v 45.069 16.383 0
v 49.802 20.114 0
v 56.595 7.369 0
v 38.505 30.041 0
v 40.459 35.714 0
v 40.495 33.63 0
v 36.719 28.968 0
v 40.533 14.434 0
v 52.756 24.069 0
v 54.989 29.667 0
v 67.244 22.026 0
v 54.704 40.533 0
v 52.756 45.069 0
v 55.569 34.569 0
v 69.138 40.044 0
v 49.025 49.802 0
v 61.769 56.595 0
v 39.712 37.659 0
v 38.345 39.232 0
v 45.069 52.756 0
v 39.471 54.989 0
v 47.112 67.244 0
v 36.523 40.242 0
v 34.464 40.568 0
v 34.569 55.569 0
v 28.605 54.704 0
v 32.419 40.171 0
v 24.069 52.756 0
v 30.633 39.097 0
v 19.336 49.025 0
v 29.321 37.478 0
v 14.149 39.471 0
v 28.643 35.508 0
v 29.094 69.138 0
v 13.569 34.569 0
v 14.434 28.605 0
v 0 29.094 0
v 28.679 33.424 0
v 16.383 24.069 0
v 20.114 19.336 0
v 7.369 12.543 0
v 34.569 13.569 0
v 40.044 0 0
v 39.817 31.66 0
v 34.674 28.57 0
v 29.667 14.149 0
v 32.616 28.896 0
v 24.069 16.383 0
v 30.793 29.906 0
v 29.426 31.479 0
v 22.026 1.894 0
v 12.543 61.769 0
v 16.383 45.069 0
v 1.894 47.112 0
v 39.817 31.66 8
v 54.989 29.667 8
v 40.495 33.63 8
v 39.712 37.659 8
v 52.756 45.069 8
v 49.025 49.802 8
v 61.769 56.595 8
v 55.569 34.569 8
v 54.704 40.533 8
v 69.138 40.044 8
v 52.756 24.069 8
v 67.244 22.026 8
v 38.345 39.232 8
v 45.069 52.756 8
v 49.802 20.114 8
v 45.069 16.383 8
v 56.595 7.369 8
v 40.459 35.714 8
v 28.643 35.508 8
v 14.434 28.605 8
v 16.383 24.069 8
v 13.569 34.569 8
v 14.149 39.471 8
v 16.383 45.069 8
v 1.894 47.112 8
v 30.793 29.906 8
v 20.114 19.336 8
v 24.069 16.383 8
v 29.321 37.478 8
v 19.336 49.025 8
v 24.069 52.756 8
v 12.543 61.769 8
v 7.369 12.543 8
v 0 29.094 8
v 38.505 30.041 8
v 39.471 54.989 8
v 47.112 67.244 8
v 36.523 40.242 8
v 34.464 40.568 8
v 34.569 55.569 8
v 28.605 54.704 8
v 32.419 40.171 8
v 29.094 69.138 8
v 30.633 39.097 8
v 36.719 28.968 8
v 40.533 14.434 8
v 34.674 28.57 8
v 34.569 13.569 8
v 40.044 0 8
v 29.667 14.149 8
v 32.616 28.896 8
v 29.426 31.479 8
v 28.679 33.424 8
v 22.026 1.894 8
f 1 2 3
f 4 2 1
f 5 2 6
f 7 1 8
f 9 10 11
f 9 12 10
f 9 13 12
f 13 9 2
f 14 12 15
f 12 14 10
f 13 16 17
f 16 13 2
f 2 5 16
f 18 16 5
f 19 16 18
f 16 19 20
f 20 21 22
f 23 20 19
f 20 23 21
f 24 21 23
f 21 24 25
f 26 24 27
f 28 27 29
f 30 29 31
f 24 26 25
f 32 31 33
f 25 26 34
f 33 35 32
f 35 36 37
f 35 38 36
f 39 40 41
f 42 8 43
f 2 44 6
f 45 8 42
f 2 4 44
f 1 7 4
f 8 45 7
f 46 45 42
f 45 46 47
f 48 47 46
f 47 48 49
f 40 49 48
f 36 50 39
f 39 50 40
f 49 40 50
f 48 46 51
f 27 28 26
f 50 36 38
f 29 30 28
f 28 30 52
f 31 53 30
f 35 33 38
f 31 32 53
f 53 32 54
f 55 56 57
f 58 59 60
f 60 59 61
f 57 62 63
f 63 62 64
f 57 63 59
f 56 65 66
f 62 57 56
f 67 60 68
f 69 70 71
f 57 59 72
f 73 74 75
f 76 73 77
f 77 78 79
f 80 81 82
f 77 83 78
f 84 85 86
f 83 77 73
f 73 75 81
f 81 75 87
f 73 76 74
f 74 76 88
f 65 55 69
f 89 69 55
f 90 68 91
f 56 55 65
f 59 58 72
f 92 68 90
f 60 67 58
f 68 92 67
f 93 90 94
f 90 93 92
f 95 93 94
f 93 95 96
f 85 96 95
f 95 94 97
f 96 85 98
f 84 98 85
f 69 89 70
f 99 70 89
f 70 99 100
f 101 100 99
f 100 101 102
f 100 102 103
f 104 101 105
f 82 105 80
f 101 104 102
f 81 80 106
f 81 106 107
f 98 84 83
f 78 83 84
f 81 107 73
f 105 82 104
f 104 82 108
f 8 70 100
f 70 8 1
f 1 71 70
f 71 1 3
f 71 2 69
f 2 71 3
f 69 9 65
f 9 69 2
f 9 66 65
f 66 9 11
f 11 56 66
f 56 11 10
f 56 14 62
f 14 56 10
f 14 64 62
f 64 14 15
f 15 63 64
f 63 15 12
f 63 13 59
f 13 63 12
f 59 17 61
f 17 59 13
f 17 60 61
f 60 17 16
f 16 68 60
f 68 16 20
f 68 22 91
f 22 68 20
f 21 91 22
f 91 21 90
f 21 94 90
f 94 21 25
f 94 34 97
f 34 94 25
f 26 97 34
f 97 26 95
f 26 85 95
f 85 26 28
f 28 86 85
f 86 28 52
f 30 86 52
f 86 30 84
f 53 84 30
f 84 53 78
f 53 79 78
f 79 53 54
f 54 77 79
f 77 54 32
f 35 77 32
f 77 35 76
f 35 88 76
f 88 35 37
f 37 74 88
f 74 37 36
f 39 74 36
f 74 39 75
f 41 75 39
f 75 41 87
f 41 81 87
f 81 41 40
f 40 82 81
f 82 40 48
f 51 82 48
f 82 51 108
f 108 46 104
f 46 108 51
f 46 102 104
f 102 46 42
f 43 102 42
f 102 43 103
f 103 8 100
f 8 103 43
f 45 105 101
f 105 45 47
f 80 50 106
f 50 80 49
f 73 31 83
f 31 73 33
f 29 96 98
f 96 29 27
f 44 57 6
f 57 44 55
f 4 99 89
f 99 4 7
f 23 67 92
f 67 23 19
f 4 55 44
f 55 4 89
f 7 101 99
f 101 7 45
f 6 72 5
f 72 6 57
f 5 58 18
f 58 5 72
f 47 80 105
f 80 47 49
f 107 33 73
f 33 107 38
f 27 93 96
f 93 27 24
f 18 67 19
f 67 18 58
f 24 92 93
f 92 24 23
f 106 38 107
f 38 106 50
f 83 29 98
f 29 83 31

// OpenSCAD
$fn = 32;

// ----------------------------------------------------------------------
// Star wheel: 12-point ratchet, R35
// ----------------------------------------------------------------------

// --- parameters (mm) ---
n_points = 12;            // number of points / teeth
r_out = 35;               // tip radius
r_in = 21;                // root radius
bore_r = 6;               // centre bore radius
plate_t = 8;              // plate thickness, Z (extrusion height)
bore_d = 12;              // centre bore diameter
fit_tol = 0.1;            // declared fit tolerance (prompt contract)
free_tol = 0.3;           // declared free tolerance (prompt contract)

profile = [[55.569, 34.569], [69.138, 40.044], [54.704, 40.533], [52.756, 45.069], [61.769, 56.595], [49.025, 49.802], [45.069, 52.756], [47.112, 67.244], [39.471, 54.989], [34.569, 55.569], [29.094, 69.138], [28.605, 54.704], [24.069, 52.756], [12.543, 61.769], [19.336, 49.025], [16.383, 45.069], [1.894, 47.112], [14.149, 39.471], [13.569, 34.569], [0, 29.094], [14.434, 28.605], [16.383, 24.069], [7.369, 12.543], [20.114, 19.336], [24.069, 16.383], [22.026, 1.894], [29.667, 14.149], [34.569, 13.569], [40.044, 0], [40.533, 14.434], [45.069, 16.383], [56.595, 7.369], [49.802, 20.114], [52.756, 24.069], [67.244, 22.026], [54.989, 29.667]];  // primary outline, 36 points, counter clockwise
void_1 = [[40.459, 35.714], [39.712, 37.659], [38.345, 39.232], [36.523, 40.242], [34.464, 40.568], [32.419, 40.171], [30.633, 39.097], [29.321, 37.478], [28.643, 35.508], [28.679, 33.424], [29.426, 31.479], [30.793, 29.906], [32.616, 28.896], [34.674, 28.57], [36.719, 28.968], [38.505, 30.041], [39.817, 31.66], [40.495, 33.63]];  // centre bore, 18 points

// --- the one profile operation ---
difference() {
  linear_extrude(height = plate_t) polygon(points = profile);
  translate([0, 0, -1])
    linear_extrude(height = plate_t + 2) polygon(points = void_1);
}
